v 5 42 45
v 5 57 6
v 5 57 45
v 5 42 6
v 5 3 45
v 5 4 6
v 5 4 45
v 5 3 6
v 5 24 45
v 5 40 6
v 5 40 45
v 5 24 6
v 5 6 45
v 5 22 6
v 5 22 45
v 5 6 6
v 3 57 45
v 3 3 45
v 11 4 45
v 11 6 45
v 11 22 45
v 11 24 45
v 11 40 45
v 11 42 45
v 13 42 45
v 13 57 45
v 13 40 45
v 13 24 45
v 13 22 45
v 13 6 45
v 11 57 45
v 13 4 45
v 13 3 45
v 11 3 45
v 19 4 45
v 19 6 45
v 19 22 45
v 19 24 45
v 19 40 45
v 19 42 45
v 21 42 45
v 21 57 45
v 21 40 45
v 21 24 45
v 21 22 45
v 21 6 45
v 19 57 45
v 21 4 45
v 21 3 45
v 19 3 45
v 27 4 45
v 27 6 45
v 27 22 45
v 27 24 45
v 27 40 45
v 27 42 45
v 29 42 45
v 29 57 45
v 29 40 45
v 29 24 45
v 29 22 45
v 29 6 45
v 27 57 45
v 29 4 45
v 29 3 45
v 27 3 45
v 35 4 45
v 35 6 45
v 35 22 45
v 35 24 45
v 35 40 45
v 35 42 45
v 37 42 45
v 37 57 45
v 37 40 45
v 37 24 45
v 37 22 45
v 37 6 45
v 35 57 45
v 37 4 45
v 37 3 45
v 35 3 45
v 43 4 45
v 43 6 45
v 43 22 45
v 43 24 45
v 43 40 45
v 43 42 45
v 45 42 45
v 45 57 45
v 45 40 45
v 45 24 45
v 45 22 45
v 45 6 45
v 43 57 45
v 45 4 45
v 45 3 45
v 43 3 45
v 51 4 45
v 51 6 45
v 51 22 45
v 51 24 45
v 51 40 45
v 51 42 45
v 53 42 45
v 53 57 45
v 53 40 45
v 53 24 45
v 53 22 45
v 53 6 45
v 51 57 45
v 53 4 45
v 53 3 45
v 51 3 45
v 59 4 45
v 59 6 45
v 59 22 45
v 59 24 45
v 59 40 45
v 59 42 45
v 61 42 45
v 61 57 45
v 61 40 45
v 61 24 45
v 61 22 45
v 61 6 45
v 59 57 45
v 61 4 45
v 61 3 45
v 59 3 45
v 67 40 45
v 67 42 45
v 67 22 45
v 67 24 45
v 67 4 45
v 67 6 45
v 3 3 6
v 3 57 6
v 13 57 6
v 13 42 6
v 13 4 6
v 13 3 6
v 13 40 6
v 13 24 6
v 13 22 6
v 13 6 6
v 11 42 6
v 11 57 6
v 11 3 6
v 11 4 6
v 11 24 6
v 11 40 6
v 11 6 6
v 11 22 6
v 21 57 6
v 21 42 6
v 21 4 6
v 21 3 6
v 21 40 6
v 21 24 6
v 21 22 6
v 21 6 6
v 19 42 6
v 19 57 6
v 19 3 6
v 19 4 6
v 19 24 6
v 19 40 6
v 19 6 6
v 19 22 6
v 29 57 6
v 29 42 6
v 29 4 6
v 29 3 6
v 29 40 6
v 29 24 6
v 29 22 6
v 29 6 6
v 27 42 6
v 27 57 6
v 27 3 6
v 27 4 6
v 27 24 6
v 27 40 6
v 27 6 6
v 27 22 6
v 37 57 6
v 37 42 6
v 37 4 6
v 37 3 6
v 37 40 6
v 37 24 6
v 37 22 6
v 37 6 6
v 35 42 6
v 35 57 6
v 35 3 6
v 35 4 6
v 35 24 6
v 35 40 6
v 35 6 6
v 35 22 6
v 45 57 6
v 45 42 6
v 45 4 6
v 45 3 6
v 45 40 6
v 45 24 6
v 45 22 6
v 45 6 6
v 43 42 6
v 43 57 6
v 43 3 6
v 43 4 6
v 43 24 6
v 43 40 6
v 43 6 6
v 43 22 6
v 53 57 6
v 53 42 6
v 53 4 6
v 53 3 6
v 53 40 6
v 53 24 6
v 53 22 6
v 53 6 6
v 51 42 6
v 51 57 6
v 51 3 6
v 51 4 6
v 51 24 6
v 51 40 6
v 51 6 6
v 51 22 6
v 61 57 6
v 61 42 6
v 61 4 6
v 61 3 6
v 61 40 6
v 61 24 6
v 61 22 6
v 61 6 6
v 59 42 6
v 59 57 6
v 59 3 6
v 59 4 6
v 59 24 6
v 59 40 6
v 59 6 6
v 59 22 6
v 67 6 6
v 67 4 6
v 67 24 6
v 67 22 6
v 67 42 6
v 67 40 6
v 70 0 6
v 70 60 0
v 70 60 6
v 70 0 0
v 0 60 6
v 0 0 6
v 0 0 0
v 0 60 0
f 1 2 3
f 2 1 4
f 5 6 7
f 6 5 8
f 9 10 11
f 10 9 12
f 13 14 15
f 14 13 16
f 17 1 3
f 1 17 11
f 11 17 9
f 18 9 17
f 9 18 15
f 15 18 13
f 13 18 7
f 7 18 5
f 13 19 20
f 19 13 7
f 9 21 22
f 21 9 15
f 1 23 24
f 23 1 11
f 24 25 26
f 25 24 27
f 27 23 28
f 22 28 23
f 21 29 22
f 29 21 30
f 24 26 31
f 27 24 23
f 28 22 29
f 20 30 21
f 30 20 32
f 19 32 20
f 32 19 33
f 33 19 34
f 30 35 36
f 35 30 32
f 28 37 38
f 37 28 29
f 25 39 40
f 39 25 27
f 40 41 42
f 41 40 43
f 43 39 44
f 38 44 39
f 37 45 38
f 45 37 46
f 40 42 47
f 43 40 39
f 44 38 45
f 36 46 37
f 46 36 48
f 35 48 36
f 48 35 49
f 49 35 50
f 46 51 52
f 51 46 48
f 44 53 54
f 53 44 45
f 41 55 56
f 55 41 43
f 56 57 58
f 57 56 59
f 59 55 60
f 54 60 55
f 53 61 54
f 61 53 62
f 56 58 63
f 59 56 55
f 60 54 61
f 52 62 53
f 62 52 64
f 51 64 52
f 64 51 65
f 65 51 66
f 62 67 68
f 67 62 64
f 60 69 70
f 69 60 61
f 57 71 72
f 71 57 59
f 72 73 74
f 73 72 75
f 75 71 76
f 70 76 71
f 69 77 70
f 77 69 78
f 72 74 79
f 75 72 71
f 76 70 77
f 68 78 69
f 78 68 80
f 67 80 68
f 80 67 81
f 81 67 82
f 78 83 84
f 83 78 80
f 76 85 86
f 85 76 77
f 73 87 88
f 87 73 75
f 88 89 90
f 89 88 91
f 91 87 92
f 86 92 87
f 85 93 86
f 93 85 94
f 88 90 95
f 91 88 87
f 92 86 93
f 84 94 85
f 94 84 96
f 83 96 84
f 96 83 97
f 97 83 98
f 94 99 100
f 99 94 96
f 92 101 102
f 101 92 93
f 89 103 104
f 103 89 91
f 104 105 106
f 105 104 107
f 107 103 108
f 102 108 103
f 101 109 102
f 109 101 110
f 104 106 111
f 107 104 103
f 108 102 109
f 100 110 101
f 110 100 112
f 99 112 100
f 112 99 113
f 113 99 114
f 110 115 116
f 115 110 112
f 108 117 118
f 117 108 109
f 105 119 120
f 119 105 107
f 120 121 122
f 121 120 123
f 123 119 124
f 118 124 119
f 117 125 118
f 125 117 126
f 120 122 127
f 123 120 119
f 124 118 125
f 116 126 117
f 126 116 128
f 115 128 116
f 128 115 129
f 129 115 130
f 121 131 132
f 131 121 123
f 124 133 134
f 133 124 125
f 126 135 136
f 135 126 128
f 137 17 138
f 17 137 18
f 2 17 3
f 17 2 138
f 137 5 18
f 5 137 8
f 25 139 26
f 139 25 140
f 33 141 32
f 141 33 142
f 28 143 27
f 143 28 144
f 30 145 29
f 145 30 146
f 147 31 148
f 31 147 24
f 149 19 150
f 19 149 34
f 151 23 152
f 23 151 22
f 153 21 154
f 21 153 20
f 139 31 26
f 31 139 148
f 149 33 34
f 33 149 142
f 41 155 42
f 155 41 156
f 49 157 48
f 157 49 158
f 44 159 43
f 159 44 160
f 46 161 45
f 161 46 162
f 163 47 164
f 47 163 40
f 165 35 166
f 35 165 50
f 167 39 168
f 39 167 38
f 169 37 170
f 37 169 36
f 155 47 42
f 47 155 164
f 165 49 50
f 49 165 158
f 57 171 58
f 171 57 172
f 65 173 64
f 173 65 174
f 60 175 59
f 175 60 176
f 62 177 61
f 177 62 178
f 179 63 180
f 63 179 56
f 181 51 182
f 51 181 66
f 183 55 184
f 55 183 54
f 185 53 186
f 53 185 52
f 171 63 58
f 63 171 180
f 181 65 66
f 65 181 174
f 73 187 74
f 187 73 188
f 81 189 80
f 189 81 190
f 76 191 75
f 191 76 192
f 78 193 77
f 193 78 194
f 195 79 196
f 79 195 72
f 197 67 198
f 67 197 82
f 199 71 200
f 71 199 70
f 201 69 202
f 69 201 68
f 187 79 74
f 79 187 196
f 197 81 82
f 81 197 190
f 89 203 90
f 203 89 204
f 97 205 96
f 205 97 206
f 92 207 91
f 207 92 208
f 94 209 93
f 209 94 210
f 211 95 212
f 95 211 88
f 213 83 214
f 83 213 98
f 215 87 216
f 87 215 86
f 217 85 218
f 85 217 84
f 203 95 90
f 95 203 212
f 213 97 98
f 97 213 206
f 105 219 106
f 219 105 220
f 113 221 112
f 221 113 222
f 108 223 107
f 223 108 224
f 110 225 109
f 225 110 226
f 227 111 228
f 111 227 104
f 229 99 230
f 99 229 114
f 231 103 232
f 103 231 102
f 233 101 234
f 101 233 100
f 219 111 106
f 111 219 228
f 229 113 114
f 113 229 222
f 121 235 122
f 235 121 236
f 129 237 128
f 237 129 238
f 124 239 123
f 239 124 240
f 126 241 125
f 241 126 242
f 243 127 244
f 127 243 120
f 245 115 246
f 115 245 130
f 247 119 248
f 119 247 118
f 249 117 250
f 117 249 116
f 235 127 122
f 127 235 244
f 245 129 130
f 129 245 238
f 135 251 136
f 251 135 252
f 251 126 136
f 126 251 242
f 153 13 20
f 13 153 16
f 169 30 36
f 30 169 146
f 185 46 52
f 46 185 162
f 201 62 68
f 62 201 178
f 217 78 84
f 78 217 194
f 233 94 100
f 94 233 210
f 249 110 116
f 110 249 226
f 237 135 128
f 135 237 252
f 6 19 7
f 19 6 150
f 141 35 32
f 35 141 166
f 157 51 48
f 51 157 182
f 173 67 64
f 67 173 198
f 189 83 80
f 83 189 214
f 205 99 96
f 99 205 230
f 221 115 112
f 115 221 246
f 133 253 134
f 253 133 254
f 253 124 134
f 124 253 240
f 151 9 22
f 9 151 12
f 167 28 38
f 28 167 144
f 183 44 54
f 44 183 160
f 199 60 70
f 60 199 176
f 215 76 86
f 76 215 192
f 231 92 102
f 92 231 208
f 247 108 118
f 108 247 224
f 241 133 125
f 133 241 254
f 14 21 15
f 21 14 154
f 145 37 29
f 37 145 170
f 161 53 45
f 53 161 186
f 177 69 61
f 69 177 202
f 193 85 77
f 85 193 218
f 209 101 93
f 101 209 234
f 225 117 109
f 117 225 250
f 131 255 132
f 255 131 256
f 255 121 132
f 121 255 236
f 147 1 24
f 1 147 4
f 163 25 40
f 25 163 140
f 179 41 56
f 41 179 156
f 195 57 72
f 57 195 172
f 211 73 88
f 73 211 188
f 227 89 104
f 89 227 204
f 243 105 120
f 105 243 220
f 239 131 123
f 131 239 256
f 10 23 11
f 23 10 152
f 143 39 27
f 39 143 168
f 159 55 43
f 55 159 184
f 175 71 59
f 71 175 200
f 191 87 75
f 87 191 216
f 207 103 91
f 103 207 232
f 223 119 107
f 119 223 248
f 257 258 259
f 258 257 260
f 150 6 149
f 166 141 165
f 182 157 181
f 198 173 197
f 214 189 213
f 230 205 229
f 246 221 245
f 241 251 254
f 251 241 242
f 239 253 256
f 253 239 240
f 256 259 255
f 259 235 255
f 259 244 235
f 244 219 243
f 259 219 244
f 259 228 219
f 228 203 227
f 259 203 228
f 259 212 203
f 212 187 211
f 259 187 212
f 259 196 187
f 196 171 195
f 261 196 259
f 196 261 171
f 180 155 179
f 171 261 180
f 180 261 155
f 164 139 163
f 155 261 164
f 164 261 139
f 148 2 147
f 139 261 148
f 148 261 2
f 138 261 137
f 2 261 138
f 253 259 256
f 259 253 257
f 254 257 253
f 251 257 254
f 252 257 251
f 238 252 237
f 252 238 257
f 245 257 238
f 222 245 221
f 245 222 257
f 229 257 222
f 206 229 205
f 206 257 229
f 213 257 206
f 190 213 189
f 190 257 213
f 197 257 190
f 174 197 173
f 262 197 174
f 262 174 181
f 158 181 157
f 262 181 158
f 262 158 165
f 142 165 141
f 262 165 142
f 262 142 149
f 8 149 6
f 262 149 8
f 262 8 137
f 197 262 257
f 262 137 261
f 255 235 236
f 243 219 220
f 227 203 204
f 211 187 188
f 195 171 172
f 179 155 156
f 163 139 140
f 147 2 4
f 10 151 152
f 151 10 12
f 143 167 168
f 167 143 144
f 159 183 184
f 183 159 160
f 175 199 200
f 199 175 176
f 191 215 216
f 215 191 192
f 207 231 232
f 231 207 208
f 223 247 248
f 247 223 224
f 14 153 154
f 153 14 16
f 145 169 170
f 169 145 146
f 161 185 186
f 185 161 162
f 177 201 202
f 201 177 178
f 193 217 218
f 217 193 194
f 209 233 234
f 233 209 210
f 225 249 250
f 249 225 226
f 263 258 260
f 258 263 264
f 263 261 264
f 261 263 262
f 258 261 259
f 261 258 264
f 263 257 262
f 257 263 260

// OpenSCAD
$fn = 32;

// ----------------------------------------------------------------------
// Heatsink: cross fin block
// ----------------------------------------------------------------------

// --- parameters (mm) ---
base_l = 70;              // base length, X
base_w = 60;              // base width, Y
base_t = 6;               // base plate thickness
fin_h = 40;               // fin height above the base
fin_t = 2;                // fin thickness
edge = 3;                 // margin from the base ends
pitch = 8;                // fin pitch
rib_pitch = 18;           // cross rib pitch

n_fins = floor((base_l - 2 * edge - fin_t) / pitch) + 1;  // fin count
total_h = base_t + fin_h - 1;  // overall height
n_ribs = floor((base_w - 2 * edge) / rib_pitch);  // rib count

union() {
  cube([base_l, base_w, base_t]);
  for (i = [0 : n_fins - 1])
    translate([edge + i * pitch, edge, base_t - 1])
      cube([fin_t, base_w - 2 * edge, fin_h]);
  for (i = [0 : n_ribs - 1])
    translate([edge, edge + 1 + i * rib_pitch, base_t - 1])
      cube([base_l - 2 * edge, fin_t, fin_h]);
}
